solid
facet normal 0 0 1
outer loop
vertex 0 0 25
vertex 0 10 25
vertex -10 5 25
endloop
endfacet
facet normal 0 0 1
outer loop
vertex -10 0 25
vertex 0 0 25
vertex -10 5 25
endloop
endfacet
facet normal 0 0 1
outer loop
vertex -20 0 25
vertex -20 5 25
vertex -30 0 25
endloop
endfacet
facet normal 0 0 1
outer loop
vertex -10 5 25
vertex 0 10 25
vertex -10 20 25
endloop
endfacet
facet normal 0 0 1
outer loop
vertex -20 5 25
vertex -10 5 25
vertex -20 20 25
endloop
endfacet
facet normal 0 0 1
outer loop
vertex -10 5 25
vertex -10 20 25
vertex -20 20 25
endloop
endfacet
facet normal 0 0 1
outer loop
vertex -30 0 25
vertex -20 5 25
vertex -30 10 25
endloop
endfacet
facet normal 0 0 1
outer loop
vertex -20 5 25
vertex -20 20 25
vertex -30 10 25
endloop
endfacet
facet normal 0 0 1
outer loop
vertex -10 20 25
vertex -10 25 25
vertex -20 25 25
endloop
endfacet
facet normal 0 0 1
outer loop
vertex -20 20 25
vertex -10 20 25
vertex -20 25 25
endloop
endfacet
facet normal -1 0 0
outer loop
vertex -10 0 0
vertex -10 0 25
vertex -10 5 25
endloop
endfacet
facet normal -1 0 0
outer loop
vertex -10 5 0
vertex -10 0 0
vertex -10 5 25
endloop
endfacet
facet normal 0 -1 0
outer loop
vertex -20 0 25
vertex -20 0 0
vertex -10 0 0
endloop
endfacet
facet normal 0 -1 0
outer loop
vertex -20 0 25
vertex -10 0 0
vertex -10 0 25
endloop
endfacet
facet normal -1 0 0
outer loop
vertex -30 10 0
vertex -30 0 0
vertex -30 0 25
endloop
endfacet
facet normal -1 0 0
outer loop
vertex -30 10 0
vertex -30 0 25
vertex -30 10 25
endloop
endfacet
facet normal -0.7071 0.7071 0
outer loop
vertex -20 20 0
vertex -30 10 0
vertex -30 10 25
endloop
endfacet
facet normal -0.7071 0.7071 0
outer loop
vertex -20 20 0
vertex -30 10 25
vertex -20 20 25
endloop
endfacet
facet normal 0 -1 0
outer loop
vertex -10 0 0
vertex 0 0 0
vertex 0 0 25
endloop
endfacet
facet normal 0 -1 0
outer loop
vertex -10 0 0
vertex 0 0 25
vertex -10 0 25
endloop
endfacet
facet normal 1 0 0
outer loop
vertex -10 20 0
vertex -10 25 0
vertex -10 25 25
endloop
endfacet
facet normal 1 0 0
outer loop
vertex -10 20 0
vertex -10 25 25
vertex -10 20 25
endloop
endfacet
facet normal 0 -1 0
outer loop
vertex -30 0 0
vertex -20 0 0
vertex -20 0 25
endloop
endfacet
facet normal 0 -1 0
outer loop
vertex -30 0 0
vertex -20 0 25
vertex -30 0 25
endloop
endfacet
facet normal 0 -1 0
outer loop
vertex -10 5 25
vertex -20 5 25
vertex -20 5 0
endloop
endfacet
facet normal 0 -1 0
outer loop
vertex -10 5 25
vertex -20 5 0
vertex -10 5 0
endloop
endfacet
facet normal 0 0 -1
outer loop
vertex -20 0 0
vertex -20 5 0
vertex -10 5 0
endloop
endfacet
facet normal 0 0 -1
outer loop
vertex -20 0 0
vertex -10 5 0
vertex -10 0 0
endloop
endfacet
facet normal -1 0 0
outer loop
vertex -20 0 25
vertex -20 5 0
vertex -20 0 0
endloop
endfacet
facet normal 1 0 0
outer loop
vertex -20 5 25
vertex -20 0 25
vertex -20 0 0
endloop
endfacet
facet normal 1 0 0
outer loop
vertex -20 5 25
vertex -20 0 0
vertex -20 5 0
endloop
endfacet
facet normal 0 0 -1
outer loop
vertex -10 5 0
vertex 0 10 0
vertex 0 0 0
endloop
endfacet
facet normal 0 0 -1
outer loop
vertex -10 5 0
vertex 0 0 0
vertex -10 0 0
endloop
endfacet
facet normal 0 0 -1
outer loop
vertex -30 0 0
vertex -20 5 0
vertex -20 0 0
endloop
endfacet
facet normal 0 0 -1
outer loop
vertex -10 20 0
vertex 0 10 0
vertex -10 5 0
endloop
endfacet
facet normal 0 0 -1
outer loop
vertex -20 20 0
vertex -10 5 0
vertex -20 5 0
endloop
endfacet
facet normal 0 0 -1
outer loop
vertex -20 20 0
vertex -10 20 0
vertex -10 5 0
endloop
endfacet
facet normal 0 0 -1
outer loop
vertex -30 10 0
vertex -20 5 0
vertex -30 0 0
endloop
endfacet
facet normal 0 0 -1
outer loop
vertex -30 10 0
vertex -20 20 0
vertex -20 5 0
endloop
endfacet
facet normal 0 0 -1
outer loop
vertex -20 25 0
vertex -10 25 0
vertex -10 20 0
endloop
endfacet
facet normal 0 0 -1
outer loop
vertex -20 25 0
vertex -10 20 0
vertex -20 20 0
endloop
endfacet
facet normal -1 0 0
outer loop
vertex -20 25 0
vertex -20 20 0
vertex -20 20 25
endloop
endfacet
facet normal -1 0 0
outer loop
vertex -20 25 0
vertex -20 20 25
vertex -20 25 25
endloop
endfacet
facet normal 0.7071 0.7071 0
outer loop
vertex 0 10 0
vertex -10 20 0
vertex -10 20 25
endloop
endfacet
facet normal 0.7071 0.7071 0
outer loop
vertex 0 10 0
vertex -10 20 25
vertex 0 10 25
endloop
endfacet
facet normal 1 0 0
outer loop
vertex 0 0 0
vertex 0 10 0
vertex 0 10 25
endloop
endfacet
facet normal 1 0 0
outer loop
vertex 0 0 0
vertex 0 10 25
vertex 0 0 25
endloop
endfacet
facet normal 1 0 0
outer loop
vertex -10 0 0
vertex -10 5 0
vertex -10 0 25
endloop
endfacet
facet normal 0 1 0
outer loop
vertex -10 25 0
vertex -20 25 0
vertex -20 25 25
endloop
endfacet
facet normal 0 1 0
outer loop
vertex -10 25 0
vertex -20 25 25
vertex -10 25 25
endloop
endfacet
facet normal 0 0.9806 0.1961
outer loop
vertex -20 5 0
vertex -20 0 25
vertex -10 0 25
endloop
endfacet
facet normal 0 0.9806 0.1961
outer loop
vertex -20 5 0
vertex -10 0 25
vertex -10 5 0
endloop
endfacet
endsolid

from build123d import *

# Parameters (mm, degrees)
BOSS_EXTRUDE1_DEPTH = 25
SKETCH2_W           = 10
SKETCH2_H           = 5
CUT_EXTRUDE1_DEPTH  = 46
BOSS_EXTRUDE3_DEPTH = 10


with BuildPart() as part:
    # Sketch1 → Boss-Extrude1 (new body)
    with BuildSketch(Plane.XY):
        Polygon((-30, 0), (-30, 10), (-20, 20), (-20, 25), (-10, 25), (-10, 20), (0, 10), (0, 0), align=None)
    extrude(amount=BOSS_EXTRUDE1_DEPTH)

    # Sketch2 → Cut-Extrude1 (cut)
    with BuildSketch(Plane.XY.offset(25)):
        with Locations((-15, 2.5)):
            Rectangle(SKETCH2_W, SKETCH2_H)
    extrude(amount=-CUT_EXTRUDE1_DEPTH, mode=Mode.SUBTRACT)


with BuildPart() as body_2:
    # Sketch3 → Boss-Extrude3 (new body)
    with BuildSketch(Plane(origin=(-20, 0, 0), x_dir=(0, 0, -1), z_dir=(1, 0, 0))):
        Polygon((-25, 0), (0, 5), (0, 0), align=None)
    extrude(amount=BOSS_EXTRUDE3_DEPTH)


solid = Compound([part.part, body_2.part])
